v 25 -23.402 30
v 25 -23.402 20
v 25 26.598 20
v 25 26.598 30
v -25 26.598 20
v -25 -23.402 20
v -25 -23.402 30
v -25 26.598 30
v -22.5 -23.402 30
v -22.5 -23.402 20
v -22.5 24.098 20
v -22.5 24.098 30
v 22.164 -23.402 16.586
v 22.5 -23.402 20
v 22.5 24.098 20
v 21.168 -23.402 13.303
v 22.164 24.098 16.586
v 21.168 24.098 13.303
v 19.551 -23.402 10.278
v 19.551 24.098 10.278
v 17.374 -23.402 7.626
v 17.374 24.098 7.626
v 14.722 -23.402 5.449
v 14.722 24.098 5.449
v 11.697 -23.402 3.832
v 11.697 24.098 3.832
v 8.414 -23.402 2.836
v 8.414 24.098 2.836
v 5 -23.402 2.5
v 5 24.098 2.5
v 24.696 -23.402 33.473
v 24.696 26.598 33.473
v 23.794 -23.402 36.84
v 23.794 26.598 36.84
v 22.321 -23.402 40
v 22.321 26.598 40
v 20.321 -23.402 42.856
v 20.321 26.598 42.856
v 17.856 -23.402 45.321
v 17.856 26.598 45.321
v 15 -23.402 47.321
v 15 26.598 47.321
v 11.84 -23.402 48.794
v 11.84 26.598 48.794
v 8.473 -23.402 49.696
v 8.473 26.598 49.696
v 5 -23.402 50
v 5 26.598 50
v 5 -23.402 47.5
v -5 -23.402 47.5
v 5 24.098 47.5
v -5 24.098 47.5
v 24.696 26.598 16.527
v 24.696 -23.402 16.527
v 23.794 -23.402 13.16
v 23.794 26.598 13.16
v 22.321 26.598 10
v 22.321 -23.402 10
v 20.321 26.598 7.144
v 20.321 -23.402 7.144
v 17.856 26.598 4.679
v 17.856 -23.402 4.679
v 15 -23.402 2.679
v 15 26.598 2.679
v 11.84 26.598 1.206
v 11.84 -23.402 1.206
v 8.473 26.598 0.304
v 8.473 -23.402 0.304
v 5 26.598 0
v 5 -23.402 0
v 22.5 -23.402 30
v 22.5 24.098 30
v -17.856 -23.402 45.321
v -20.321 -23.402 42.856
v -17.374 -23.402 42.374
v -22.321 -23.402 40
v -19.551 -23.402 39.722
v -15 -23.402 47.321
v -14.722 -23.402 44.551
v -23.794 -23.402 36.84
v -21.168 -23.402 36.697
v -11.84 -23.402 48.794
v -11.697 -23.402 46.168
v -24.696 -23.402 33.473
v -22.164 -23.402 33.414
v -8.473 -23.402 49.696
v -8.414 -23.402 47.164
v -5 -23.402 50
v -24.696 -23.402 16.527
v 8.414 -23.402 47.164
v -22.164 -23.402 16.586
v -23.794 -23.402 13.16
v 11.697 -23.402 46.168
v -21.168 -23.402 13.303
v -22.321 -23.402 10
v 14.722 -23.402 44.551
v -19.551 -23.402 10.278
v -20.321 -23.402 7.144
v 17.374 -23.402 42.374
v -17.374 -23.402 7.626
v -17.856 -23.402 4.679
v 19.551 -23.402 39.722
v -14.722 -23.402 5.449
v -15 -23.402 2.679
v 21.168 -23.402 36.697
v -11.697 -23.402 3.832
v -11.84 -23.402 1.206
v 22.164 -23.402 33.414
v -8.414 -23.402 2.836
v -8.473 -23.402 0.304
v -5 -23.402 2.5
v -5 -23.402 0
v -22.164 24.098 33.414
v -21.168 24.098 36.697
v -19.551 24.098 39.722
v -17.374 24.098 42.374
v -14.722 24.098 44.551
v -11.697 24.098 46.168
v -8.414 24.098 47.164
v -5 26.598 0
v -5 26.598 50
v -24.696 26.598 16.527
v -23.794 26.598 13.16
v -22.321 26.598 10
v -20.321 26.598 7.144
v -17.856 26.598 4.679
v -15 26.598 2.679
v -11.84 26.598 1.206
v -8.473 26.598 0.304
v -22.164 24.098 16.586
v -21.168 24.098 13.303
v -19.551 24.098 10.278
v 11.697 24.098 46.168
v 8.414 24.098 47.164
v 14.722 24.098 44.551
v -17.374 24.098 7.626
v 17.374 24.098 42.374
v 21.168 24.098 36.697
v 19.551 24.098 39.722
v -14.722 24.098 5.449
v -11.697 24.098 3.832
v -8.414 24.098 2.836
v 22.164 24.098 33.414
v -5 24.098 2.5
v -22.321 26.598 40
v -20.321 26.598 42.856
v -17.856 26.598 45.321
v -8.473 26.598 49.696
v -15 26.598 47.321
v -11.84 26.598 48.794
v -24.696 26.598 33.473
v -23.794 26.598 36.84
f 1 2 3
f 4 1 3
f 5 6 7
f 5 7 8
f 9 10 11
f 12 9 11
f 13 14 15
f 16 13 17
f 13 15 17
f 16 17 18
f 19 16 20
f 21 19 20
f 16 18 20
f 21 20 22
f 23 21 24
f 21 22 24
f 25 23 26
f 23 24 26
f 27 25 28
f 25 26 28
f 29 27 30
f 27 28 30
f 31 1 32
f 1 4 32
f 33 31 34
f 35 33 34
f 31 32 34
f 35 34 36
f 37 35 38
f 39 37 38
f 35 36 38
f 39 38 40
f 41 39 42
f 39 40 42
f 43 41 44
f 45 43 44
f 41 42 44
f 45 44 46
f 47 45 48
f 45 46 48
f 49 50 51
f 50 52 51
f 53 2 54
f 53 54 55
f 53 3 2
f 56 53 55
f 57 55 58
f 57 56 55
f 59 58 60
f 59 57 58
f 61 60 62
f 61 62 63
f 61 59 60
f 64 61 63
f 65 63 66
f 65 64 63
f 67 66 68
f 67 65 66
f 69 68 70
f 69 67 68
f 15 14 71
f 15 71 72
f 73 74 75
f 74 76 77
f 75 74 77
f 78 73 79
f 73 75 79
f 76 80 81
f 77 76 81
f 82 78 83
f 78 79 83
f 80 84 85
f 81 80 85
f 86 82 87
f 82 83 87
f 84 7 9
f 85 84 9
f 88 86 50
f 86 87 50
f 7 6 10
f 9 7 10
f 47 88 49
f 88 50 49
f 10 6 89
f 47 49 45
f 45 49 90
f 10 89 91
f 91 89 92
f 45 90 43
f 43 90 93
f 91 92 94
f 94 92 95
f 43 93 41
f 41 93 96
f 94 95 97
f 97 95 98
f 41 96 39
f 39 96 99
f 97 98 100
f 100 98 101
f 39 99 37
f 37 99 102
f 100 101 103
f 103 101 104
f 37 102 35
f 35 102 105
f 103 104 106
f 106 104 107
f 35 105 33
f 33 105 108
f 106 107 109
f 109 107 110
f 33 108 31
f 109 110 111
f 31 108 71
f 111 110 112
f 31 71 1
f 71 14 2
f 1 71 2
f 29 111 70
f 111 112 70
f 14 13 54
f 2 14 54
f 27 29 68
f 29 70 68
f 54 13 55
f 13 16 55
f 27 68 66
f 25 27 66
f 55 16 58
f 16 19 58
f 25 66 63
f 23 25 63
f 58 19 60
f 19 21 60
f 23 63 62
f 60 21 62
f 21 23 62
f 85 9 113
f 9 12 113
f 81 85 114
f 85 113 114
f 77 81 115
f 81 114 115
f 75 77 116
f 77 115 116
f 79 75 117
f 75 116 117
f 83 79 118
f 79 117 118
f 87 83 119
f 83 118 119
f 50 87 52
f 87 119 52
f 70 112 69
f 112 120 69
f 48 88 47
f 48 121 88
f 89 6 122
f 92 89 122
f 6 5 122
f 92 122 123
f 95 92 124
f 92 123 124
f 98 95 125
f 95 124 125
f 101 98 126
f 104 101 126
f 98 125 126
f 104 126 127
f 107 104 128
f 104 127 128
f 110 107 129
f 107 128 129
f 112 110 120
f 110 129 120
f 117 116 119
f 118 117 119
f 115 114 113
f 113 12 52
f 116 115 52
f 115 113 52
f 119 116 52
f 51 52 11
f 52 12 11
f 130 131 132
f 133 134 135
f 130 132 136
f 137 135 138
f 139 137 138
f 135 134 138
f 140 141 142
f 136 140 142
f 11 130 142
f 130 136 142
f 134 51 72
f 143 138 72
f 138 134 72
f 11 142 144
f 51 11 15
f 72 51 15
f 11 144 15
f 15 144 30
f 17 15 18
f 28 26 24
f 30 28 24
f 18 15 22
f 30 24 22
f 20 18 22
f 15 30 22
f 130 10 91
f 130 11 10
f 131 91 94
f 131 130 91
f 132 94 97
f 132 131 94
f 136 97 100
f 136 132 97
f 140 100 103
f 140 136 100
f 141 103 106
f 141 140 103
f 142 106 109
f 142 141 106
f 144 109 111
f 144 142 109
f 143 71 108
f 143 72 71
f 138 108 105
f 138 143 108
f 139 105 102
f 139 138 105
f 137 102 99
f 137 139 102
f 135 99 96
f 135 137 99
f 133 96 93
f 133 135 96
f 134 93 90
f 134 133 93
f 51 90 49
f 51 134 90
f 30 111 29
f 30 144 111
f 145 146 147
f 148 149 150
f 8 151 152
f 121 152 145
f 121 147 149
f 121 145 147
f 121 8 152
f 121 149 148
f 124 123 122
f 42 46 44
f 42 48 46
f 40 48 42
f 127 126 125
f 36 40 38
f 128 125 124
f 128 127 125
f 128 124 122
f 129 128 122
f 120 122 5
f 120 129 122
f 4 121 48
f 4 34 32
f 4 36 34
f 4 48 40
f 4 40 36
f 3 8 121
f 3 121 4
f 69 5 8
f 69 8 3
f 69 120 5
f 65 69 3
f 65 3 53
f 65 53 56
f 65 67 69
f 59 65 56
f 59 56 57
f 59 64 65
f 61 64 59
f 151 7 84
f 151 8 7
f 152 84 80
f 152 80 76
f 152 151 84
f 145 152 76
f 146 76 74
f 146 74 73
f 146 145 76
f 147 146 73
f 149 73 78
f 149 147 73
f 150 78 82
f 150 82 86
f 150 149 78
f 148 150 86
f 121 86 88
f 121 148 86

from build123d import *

# Parameters (mm, degrees)
F0_W     = 50
F0_H     = 50
F1_DEPTH = 50
F2_R     = 20
F3_T     = -2.5


with BuildPart() as f1:
    # F0 (on Top) → F1 (new body)
    with BuildSketch(Plane.XY):
        with Locations((0, 1.597746)):
            Rectangle(F0_W, F0_H)
    extrude(amount=F1_DEPTH)

    # F2
    f2_edges = [f1.edges().sort_by_distance(p)[0] for p in [
        (25, 1.597746, 0),
        (-25, 1.597746, 0),
        (25, 1.597746, 50),
        (-25, 1.597746, 50),
    ]]
    fillet(f2_edges, radius=F2_R)

    # F3
    f3_openings = [f1.faces().sort_by_distance(p)[0] for p in [
        (0, -23.402254, 25),
    ]]
    offset(amount=F3_T, openings=f3_openings)


solid = f1.part
